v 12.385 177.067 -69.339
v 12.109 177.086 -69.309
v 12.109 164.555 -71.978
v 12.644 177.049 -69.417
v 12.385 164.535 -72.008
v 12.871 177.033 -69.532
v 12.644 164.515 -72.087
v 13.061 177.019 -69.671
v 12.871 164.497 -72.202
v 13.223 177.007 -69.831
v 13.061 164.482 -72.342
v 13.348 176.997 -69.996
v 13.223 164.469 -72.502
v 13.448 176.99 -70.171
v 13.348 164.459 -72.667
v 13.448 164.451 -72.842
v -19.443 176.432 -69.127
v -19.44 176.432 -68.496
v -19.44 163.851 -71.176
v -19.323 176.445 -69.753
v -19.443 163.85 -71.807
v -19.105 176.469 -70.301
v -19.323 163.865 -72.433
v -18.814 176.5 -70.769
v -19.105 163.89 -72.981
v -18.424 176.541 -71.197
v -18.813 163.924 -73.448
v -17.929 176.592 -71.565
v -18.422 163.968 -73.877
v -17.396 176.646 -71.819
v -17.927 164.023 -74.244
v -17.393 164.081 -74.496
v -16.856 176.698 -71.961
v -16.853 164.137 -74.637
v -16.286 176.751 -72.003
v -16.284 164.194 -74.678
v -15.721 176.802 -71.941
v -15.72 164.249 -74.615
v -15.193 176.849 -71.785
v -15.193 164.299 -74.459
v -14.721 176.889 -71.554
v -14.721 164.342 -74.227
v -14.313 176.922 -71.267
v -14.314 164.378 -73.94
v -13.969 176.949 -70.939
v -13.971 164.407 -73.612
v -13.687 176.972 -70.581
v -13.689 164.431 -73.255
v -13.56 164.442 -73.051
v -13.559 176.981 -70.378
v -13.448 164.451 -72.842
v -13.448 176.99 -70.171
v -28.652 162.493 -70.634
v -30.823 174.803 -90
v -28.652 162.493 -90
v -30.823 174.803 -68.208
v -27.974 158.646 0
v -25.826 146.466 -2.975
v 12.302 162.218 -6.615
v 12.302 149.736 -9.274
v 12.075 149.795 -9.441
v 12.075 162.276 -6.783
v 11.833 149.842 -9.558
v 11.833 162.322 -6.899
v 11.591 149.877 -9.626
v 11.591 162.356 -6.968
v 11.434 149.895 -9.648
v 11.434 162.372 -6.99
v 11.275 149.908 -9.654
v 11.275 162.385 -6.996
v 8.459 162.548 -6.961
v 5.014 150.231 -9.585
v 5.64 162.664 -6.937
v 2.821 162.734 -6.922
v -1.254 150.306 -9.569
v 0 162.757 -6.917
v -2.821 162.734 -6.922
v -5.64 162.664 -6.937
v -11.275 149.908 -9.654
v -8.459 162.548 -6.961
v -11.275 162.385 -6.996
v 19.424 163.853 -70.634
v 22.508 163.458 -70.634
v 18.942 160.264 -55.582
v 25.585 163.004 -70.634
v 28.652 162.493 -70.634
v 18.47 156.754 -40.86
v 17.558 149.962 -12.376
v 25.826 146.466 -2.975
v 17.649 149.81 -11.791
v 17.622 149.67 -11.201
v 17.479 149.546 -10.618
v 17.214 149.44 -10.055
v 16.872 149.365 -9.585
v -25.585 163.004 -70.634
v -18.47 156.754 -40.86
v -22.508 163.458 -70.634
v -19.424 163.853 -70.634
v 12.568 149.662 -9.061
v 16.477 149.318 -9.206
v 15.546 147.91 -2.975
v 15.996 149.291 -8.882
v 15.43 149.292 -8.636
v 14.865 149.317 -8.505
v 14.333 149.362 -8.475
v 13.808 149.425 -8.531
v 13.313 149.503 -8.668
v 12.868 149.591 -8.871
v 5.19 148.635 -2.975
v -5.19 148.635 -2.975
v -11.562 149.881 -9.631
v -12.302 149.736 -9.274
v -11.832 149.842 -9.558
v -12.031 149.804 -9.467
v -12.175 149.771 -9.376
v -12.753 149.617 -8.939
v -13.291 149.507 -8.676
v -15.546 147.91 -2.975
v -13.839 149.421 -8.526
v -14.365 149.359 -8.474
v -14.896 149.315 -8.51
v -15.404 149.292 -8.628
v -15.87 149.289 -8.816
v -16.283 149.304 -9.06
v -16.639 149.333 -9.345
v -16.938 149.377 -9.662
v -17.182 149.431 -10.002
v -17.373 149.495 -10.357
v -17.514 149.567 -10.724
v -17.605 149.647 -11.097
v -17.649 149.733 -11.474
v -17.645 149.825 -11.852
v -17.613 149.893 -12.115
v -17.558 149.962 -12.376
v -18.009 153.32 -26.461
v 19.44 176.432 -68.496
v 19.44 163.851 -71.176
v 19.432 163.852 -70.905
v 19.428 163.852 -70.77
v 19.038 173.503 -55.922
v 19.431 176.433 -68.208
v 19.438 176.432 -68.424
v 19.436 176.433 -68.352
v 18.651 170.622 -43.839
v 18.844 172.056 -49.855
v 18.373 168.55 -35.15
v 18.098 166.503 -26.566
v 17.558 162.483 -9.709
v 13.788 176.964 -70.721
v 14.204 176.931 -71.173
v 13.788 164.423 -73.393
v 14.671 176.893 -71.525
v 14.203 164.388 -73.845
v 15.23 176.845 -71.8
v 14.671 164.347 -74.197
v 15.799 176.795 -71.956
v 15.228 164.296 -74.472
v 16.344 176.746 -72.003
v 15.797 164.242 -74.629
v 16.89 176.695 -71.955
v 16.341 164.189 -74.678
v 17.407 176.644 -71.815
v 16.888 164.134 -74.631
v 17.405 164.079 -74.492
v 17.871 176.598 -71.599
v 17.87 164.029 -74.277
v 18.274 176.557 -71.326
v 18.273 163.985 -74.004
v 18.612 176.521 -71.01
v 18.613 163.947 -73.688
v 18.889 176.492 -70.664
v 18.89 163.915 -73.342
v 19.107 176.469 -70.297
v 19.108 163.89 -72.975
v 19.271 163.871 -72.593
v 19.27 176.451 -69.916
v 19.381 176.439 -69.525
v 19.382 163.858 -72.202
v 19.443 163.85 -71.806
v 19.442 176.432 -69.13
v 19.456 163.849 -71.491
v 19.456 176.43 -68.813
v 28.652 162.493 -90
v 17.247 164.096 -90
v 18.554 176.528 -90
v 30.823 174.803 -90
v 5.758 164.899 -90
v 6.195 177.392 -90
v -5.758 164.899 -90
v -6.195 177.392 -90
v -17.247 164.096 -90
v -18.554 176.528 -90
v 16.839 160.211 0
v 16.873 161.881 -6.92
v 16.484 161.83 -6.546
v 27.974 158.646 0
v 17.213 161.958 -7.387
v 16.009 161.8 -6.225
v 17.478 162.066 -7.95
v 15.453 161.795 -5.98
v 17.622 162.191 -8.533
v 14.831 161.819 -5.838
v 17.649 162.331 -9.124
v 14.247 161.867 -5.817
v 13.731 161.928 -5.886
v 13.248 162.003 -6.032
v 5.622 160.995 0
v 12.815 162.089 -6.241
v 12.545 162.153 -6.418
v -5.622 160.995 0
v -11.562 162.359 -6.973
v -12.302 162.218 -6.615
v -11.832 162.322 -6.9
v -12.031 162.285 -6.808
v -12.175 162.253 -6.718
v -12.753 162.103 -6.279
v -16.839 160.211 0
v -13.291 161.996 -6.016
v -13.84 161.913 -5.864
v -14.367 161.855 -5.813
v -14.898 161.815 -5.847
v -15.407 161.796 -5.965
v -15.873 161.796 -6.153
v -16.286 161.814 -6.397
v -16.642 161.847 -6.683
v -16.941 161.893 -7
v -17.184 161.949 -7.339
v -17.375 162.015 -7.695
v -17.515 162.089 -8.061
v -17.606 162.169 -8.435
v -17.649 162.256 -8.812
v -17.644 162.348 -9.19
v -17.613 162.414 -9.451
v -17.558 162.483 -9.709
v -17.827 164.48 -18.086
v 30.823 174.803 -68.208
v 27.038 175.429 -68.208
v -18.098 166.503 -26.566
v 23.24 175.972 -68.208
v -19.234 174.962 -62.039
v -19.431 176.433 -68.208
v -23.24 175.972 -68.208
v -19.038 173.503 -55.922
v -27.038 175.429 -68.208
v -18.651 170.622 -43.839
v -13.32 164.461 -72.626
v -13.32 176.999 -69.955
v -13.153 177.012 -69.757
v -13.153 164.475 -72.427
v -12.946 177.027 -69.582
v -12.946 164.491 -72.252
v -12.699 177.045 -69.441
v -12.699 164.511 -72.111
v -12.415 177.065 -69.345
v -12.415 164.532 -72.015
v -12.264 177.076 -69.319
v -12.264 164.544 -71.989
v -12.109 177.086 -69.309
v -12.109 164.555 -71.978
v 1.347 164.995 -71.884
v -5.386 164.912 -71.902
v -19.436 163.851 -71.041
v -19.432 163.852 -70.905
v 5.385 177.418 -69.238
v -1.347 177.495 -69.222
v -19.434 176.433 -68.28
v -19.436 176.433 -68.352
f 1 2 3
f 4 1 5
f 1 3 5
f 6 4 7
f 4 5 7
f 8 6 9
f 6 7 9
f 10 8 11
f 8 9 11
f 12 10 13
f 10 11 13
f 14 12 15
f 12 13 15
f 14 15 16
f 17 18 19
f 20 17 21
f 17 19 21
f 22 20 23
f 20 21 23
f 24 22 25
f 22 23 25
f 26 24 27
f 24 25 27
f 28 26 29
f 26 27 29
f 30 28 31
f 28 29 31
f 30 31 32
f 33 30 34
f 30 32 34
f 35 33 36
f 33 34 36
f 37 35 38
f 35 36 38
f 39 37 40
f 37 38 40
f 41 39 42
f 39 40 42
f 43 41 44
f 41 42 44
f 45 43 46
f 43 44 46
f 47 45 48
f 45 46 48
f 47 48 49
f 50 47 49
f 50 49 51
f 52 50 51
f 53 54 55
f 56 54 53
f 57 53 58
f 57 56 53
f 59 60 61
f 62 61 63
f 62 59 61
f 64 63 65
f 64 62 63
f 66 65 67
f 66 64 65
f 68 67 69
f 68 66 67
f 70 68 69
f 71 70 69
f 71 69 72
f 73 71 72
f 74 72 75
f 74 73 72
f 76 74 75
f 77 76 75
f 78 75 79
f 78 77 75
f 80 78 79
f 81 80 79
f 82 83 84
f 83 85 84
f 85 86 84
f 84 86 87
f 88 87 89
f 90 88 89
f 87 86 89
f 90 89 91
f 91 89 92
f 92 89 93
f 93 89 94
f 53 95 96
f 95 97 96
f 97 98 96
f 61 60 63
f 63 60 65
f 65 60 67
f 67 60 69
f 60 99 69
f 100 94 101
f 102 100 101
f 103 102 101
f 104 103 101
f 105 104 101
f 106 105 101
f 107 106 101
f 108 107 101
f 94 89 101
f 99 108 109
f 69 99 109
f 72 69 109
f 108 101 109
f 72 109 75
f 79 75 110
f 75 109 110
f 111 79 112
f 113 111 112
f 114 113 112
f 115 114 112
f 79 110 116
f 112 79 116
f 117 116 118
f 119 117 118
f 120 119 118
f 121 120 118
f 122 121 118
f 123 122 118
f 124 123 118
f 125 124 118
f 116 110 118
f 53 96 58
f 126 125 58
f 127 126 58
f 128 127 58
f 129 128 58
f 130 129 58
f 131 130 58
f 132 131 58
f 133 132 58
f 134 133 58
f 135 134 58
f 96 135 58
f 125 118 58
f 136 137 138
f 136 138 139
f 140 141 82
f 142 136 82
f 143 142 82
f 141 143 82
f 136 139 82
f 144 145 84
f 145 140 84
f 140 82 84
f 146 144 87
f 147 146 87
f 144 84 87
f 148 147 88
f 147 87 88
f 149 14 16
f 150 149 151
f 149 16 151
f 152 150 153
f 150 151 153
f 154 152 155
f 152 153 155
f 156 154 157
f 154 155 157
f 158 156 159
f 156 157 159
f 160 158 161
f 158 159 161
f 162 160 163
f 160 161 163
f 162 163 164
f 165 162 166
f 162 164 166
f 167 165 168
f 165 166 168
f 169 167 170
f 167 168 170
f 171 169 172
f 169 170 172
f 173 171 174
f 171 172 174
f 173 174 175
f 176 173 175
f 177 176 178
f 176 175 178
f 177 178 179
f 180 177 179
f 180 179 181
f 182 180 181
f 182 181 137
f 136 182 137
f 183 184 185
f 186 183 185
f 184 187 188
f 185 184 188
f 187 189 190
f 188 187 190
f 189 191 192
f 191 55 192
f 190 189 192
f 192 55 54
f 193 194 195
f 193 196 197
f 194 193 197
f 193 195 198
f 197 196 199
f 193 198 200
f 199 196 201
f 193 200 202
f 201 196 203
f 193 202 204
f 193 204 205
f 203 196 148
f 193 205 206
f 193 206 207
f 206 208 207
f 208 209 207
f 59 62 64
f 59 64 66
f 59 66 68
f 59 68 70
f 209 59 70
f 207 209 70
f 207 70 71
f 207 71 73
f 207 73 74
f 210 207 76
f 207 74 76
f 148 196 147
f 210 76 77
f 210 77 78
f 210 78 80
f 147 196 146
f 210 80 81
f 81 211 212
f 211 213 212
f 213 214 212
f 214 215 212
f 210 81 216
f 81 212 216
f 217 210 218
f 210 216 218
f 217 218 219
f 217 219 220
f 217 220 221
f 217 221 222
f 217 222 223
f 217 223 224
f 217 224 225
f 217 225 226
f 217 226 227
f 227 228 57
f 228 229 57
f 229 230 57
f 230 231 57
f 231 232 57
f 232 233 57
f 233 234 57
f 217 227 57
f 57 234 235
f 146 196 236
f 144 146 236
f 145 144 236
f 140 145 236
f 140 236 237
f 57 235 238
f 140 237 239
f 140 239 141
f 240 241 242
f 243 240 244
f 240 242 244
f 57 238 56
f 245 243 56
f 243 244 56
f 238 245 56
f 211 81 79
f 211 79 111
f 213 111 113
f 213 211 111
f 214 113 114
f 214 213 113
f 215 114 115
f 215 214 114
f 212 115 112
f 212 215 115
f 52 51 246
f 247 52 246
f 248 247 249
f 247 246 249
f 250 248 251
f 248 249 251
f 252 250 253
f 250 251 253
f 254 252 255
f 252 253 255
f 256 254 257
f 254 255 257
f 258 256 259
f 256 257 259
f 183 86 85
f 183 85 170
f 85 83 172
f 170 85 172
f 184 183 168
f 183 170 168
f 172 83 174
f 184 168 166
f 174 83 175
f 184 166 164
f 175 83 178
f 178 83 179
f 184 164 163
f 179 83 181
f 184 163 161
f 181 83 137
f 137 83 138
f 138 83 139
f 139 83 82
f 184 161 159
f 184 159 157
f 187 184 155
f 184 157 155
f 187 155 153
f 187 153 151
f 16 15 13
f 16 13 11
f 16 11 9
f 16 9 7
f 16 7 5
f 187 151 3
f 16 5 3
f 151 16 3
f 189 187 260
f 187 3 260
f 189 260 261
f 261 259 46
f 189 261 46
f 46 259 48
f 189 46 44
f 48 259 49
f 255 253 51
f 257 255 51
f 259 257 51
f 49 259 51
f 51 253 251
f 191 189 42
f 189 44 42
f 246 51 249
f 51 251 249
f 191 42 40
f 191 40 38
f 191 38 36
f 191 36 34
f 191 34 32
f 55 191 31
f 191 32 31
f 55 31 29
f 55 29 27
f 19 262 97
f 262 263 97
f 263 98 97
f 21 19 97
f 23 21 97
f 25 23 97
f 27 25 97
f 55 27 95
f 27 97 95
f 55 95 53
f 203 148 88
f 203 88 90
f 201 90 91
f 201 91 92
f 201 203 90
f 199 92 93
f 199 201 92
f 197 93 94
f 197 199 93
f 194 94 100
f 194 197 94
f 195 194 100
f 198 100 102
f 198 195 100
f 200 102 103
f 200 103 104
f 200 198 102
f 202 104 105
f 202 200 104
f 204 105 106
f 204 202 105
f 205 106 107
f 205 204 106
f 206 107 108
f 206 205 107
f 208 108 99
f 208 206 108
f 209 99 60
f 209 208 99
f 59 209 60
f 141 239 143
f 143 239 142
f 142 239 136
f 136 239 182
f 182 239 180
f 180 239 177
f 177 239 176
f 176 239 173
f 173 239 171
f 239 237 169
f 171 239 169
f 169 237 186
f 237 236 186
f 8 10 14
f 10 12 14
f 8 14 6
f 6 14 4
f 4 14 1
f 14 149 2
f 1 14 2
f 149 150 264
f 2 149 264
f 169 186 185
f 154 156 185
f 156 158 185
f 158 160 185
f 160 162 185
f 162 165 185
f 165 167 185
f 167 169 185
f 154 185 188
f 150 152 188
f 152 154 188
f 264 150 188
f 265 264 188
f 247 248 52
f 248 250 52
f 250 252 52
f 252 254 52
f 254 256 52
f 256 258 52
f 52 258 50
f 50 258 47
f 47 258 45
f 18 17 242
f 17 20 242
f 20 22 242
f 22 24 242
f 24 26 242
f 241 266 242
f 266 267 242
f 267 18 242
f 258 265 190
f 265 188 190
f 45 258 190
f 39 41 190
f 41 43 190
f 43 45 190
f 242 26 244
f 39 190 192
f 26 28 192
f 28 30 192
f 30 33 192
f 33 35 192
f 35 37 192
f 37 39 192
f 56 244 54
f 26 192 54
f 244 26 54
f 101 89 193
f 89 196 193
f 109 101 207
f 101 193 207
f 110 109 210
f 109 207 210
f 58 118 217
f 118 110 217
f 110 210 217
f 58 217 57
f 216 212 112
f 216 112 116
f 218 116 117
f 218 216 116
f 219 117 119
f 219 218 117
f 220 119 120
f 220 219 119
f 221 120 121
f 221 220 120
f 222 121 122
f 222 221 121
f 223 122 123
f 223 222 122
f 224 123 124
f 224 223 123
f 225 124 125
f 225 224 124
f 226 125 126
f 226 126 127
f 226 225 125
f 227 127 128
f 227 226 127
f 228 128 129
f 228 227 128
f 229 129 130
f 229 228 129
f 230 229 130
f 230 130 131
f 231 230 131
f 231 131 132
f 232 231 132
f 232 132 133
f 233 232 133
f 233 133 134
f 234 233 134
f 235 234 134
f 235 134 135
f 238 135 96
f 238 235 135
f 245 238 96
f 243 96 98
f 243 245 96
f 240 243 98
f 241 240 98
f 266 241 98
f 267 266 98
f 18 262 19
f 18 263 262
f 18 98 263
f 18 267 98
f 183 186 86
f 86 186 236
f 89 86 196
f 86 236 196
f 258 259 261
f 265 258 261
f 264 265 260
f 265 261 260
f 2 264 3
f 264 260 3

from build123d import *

# Parameters (mm, degrees)
ROTATION1_ANGLE                      = 20
SCHNITT_LINEAR_AUSTRAGEN2_DEPTH      = 15.24
SCHNITT_LINEAR_AUSTRAGEN2_DEPTH_BACK = 2.54


with BuildPart() as part:
    # Skizze1 → Rotation1 (revolve, symmetric)
    with BuildSketch(Plane(origin=(0, 0, 0), x_dir=(0, 0, -1), z_dir=(1, 0, 0))) as rotation1_sk:
        Polygon((0, 161.09315), (68.208324134, 177.5), (90, 177.5), (90, 165), (70.634410551, 165), (2.974994021, 148.725184394), align=None)
    revolve(axis=Axis((0, 0, 0), (0, 0, -1)), revolution_arc=ROTATION1_ANGLE / 2)
    revolve(rotation1_sk.sketch, axis=Axis((0, 0, 0), (0, 0, 1)), revolution_arc=ROTATION1_ANGLE / 2)

    # Skizze4 → Schnitt-Linear austragen2 (cut, two sides)
    with BuildSketch(Plane(origin=(0, 169.424608185, -38.218632457), x_dir=(-1, 0, 0), z_dir=(0, -0.978056789, -0.208338468))) as schnitt_linear_austragen2_sk:
        with BuildLine():
            Line((12.109444482, 32.004), (-12.109444482, 32.004))
            ThreePointArc((-12.109444482, 32.004), (-12.895155782, 32.226245034), (-13.448039836, 32.827122995))
            ThreePointArc((-13.448039836, 32.827122995), (-17.173364468, 34.441533799), (-19.440102095, 31.073111855))
            Line((-19.440102095, 31.073111855), (-17.558493636, -29.330115121))
            ThreePointArc((-17.558493636, -29.330115121), (-16.083752787, -32.838011315), (-12.302447063, -32.411486631))
            ThreePointArc((-12.302447063, -32.411486631), (-11.827451319, -32.109587928), (-11.274626778, -32.004))
            Line((-11.274626778, -32.004), (11.274626778, -32.004))
            ThreePointArc((11.274626778, -32.004), (11.827451319, -32.109587928), (12.302447063, -32.411486631))
            ThreePointArc((12.302447063, -32.411486631), (16.083752787, -32.838011315), (17.558493636, -29.330115121))
            Line((17.558493636, -29.330115121), (19.440102095, 31.073111855))
            ThreePointArc((19.440102095, 31.073111855), (17.173364468, 34.441533799), (13.448039836, 32.827122995))
            ThreePointArc((13.448039836, 32.827122995), (12.895155782, 32.226245034), (12.109444482, 32.004))
        make_face()
    extrude(amount=SCHNITT_LINEAR_AUSTRAGEN2_DEPTH, mode=Mode.SUBTRACT)
    extrude(schnitt_linear_austragen2_sk.sketch, amount=-SCHNITT_LINEAR_AUSTRAGEN2_DEPTH_BACK, mode=Mode.SUBTRACT)


solid = part.part
